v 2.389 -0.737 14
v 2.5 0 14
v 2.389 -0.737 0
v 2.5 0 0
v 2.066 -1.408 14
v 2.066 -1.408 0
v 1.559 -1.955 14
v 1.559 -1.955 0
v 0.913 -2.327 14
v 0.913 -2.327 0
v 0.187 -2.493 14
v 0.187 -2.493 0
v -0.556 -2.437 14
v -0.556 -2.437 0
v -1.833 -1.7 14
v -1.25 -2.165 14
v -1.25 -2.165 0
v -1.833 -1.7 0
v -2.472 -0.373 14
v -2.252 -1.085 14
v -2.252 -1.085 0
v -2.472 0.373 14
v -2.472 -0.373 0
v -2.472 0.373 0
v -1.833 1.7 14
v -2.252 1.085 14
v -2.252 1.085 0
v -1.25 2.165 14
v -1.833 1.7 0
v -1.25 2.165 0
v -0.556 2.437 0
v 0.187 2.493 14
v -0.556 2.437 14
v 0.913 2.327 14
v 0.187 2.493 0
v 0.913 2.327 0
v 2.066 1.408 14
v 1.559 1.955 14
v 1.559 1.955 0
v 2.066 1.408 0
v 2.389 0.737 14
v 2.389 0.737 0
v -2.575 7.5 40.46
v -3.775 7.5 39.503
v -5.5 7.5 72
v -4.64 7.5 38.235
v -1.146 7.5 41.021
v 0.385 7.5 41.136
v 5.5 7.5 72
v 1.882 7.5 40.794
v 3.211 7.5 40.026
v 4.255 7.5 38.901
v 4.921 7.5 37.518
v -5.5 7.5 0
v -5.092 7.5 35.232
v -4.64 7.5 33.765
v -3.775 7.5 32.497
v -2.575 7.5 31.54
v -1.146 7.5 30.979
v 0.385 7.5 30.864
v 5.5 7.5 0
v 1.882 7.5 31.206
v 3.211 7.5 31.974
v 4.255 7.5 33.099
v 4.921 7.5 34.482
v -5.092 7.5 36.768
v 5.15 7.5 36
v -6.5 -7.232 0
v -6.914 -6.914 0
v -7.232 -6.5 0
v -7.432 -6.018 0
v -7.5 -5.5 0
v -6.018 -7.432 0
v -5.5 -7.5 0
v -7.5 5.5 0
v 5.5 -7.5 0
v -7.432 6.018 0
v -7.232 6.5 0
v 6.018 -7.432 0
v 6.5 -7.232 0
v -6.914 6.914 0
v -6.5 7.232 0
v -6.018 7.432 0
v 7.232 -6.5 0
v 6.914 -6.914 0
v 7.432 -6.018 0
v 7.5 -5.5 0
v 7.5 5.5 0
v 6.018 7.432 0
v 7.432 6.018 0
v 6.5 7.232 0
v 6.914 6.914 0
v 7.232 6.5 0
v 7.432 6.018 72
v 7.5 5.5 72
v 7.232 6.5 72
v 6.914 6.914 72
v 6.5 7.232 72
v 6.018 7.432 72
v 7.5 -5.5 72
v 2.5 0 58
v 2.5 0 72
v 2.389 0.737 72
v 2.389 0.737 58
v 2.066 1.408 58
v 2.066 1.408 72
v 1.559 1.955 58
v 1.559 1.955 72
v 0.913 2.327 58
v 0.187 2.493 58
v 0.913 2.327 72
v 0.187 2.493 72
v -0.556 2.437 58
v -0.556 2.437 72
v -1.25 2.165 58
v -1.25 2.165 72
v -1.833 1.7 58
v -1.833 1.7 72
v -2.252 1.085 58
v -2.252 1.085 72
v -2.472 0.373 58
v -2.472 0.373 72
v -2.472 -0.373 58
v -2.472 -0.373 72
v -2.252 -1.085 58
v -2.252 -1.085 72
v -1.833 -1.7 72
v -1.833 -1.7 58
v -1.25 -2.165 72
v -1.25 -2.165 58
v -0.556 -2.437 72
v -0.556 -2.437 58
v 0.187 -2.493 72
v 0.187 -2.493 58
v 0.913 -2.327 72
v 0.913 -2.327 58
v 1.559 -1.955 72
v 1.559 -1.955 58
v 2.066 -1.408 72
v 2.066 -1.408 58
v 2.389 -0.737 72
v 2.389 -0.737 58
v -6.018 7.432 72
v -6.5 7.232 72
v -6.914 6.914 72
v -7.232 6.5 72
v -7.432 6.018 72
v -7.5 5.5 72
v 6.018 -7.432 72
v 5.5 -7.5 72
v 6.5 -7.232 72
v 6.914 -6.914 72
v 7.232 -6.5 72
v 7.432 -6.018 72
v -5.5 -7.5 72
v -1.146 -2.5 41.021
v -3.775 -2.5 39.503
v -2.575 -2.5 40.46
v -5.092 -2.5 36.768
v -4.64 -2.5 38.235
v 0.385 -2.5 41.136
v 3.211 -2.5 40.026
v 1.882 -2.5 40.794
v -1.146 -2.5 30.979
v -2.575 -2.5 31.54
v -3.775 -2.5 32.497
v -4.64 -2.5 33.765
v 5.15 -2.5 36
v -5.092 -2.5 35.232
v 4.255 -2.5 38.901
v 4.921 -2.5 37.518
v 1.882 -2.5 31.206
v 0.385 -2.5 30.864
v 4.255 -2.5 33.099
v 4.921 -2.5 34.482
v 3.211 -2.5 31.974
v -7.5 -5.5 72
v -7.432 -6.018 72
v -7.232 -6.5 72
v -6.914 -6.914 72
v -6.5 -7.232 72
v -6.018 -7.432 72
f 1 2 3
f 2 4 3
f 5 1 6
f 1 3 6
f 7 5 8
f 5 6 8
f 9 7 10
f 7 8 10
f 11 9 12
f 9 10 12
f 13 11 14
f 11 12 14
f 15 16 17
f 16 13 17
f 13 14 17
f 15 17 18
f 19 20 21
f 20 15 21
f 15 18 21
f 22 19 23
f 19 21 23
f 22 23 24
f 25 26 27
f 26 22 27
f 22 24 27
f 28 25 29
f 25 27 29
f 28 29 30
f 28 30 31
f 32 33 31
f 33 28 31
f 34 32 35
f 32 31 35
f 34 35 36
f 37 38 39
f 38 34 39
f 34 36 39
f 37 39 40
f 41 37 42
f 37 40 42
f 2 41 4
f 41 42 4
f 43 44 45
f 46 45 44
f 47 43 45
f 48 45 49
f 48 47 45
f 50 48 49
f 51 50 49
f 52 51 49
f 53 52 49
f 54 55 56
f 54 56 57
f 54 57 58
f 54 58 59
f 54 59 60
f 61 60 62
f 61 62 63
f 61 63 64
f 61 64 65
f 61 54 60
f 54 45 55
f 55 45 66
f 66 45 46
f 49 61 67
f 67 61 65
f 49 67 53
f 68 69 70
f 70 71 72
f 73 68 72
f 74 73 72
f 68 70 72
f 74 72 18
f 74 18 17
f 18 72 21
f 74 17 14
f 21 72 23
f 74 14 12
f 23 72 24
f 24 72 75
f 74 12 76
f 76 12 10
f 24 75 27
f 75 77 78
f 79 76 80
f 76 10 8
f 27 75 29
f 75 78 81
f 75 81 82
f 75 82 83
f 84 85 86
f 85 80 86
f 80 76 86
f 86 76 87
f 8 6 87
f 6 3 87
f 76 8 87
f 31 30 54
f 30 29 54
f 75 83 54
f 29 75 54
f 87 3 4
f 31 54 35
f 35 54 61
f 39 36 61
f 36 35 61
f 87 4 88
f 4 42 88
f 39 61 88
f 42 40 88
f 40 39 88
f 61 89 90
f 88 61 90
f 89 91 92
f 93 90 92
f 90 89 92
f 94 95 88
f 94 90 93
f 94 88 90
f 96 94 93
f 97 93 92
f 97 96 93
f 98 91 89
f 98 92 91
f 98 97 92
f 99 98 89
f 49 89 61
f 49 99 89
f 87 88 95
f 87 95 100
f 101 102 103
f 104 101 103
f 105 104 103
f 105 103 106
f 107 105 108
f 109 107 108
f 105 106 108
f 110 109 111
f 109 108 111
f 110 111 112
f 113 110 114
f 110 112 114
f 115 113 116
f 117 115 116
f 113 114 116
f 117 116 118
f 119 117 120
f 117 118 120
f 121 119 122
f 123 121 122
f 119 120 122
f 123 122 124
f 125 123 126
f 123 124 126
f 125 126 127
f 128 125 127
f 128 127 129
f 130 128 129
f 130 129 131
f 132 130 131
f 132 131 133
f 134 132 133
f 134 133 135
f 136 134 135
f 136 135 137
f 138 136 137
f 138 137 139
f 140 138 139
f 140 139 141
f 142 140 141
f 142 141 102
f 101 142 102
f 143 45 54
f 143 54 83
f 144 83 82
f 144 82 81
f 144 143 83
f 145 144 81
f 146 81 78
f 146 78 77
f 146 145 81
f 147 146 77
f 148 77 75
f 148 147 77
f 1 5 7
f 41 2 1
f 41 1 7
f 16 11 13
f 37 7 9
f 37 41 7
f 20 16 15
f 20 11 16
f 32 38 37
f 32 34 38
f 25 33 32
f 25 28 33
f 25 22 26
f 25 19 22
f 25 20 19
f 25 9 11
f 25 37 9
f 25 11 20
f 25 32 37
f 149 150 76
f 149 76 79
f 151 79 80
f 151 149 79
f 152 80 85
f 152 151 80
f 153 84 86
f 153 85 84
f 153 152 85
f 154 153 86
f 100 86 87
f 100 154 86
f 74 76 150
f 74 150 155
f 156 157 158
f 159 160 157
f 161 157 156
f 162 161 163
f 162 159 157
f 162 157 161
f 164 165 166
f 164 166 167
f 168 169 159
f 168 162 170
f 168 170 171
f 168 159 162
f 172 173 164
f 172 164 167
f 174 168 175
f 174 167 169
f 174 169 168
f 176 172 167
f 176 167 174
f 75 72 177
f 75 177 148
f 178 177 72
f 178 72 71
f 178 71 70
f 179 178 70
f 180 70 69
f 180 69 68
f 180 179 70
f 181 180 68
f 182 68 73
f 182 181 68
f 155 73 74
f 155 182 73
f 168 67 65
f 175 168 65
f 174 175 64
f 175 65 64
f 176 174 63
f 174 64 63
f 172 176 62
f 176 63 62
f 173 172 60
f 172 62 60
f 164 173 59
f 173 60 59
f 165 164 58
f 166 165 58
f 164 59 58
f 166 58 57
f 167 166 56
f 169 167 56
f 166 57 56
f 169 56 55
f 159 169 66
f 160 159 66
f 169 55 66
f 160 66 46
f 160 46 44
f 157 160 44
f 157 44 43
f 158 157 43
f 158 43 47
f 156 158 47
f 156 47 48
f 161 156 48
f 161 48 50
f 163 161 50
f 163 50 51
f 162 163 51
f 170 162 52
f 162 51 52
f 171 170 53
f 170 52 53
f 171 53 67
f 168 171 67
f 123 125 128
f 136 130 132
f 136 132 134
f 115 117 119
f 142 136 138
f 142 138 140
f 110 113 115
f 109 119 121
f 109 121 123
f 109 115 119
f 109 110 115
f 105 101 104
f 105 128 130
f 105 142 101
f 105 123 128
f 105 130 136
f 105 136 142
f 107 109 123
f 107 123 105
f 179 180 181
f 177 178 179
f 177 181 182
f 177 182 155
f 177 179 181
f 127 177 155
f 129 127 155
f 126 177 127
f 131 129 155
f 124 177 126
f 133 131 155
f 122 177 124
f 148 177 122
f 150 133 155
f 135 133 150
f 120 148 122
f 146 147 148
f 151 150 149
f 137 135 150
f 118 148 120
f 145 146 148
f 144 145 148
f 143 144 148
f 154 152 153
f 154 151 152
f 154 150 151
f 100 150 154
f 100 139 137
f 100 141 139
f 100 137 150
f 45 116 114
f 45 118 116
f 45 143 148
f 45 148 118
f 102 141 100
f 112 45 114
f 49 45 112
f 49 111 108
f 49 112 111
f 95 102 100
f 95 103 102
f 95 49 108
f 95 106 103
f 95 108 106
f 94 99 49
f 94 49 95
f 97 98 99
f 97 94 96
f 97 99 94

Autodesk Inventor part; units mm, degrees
ref_plane "YZ Plane" through (0, 0, 0) normal (1, 0, 0) x (0, 1, 0)
ref_plane "XZ Plane" through (0, 0, 0) normal (0, 1, 0) x (-1, 0, 0)
sketch "Sketch1" plane through (0, 0, 0) normal (0, 0, 1) x (1, 0, 0)
  line L0 (-7.5, 7.5) -> (7.5, 7.5)
  line L1 (7.5, 7.5) -> (7.5, -7.5)
  line L2 (7.5, -7.5) -> (-7.5, -7.5)
  line L3 (-7.5, -7.5) -> (-7.5, 7.5)
  line L4 (-7.5, 7.5) -> (7.5, -7.5) construction
  line L5 (7.5, 7.5) -> (-7.5, -7.5) construction
  point P0 (0, 0)
  dimension "d0" = 15
  dimension "d1" = 15
extrude "Extrusion1" add sketch "Sketch1" along normal blind 72
sketch "Sketch2" plane through (0, 0, 72) normal (0, 0, 1) x (1, 0, 0)
  circle A0 centre (0, 0) radius 2.5
  dimension "d4" = 5
extrude "Extrusion2" cut sketch "Sketch2" against normal blind 14
ref_plane "Work Plane1" through (0, 0, 36) normal (0, 0, 1) x (1, 0, 0)
mirror "Mirror1" about plane through (0, 0, 36) normal (0, 0, 1) of "Extrusion2"
fillet "Fillet1" radius 2 4 edges at (7.5, 7.5, 36) (-7.5, 7.5, 36) (7.5, -7.5, 36) (-7.5, -7.5, 36)
sketch "Sketch3" plane through (-5.5, 7.5, 0) normal (0, 1, 0) x (1, 0, 0)
  line L0 (-2, -72) -> (-2, 0) projected
  line L1 (-2, -36) -> (13, -36)
  line L2 (13, 0) -> (13, -72) projected
  circle A0 centre (5.5, -36) radius 5.15
  point P0 (5.5, 0)
  dimension "d8" = 10.3
extrude "Extrusion3" cut sketch "Sketch3" against normal blind 10
properties part number "FP V2 Claw Connector"
